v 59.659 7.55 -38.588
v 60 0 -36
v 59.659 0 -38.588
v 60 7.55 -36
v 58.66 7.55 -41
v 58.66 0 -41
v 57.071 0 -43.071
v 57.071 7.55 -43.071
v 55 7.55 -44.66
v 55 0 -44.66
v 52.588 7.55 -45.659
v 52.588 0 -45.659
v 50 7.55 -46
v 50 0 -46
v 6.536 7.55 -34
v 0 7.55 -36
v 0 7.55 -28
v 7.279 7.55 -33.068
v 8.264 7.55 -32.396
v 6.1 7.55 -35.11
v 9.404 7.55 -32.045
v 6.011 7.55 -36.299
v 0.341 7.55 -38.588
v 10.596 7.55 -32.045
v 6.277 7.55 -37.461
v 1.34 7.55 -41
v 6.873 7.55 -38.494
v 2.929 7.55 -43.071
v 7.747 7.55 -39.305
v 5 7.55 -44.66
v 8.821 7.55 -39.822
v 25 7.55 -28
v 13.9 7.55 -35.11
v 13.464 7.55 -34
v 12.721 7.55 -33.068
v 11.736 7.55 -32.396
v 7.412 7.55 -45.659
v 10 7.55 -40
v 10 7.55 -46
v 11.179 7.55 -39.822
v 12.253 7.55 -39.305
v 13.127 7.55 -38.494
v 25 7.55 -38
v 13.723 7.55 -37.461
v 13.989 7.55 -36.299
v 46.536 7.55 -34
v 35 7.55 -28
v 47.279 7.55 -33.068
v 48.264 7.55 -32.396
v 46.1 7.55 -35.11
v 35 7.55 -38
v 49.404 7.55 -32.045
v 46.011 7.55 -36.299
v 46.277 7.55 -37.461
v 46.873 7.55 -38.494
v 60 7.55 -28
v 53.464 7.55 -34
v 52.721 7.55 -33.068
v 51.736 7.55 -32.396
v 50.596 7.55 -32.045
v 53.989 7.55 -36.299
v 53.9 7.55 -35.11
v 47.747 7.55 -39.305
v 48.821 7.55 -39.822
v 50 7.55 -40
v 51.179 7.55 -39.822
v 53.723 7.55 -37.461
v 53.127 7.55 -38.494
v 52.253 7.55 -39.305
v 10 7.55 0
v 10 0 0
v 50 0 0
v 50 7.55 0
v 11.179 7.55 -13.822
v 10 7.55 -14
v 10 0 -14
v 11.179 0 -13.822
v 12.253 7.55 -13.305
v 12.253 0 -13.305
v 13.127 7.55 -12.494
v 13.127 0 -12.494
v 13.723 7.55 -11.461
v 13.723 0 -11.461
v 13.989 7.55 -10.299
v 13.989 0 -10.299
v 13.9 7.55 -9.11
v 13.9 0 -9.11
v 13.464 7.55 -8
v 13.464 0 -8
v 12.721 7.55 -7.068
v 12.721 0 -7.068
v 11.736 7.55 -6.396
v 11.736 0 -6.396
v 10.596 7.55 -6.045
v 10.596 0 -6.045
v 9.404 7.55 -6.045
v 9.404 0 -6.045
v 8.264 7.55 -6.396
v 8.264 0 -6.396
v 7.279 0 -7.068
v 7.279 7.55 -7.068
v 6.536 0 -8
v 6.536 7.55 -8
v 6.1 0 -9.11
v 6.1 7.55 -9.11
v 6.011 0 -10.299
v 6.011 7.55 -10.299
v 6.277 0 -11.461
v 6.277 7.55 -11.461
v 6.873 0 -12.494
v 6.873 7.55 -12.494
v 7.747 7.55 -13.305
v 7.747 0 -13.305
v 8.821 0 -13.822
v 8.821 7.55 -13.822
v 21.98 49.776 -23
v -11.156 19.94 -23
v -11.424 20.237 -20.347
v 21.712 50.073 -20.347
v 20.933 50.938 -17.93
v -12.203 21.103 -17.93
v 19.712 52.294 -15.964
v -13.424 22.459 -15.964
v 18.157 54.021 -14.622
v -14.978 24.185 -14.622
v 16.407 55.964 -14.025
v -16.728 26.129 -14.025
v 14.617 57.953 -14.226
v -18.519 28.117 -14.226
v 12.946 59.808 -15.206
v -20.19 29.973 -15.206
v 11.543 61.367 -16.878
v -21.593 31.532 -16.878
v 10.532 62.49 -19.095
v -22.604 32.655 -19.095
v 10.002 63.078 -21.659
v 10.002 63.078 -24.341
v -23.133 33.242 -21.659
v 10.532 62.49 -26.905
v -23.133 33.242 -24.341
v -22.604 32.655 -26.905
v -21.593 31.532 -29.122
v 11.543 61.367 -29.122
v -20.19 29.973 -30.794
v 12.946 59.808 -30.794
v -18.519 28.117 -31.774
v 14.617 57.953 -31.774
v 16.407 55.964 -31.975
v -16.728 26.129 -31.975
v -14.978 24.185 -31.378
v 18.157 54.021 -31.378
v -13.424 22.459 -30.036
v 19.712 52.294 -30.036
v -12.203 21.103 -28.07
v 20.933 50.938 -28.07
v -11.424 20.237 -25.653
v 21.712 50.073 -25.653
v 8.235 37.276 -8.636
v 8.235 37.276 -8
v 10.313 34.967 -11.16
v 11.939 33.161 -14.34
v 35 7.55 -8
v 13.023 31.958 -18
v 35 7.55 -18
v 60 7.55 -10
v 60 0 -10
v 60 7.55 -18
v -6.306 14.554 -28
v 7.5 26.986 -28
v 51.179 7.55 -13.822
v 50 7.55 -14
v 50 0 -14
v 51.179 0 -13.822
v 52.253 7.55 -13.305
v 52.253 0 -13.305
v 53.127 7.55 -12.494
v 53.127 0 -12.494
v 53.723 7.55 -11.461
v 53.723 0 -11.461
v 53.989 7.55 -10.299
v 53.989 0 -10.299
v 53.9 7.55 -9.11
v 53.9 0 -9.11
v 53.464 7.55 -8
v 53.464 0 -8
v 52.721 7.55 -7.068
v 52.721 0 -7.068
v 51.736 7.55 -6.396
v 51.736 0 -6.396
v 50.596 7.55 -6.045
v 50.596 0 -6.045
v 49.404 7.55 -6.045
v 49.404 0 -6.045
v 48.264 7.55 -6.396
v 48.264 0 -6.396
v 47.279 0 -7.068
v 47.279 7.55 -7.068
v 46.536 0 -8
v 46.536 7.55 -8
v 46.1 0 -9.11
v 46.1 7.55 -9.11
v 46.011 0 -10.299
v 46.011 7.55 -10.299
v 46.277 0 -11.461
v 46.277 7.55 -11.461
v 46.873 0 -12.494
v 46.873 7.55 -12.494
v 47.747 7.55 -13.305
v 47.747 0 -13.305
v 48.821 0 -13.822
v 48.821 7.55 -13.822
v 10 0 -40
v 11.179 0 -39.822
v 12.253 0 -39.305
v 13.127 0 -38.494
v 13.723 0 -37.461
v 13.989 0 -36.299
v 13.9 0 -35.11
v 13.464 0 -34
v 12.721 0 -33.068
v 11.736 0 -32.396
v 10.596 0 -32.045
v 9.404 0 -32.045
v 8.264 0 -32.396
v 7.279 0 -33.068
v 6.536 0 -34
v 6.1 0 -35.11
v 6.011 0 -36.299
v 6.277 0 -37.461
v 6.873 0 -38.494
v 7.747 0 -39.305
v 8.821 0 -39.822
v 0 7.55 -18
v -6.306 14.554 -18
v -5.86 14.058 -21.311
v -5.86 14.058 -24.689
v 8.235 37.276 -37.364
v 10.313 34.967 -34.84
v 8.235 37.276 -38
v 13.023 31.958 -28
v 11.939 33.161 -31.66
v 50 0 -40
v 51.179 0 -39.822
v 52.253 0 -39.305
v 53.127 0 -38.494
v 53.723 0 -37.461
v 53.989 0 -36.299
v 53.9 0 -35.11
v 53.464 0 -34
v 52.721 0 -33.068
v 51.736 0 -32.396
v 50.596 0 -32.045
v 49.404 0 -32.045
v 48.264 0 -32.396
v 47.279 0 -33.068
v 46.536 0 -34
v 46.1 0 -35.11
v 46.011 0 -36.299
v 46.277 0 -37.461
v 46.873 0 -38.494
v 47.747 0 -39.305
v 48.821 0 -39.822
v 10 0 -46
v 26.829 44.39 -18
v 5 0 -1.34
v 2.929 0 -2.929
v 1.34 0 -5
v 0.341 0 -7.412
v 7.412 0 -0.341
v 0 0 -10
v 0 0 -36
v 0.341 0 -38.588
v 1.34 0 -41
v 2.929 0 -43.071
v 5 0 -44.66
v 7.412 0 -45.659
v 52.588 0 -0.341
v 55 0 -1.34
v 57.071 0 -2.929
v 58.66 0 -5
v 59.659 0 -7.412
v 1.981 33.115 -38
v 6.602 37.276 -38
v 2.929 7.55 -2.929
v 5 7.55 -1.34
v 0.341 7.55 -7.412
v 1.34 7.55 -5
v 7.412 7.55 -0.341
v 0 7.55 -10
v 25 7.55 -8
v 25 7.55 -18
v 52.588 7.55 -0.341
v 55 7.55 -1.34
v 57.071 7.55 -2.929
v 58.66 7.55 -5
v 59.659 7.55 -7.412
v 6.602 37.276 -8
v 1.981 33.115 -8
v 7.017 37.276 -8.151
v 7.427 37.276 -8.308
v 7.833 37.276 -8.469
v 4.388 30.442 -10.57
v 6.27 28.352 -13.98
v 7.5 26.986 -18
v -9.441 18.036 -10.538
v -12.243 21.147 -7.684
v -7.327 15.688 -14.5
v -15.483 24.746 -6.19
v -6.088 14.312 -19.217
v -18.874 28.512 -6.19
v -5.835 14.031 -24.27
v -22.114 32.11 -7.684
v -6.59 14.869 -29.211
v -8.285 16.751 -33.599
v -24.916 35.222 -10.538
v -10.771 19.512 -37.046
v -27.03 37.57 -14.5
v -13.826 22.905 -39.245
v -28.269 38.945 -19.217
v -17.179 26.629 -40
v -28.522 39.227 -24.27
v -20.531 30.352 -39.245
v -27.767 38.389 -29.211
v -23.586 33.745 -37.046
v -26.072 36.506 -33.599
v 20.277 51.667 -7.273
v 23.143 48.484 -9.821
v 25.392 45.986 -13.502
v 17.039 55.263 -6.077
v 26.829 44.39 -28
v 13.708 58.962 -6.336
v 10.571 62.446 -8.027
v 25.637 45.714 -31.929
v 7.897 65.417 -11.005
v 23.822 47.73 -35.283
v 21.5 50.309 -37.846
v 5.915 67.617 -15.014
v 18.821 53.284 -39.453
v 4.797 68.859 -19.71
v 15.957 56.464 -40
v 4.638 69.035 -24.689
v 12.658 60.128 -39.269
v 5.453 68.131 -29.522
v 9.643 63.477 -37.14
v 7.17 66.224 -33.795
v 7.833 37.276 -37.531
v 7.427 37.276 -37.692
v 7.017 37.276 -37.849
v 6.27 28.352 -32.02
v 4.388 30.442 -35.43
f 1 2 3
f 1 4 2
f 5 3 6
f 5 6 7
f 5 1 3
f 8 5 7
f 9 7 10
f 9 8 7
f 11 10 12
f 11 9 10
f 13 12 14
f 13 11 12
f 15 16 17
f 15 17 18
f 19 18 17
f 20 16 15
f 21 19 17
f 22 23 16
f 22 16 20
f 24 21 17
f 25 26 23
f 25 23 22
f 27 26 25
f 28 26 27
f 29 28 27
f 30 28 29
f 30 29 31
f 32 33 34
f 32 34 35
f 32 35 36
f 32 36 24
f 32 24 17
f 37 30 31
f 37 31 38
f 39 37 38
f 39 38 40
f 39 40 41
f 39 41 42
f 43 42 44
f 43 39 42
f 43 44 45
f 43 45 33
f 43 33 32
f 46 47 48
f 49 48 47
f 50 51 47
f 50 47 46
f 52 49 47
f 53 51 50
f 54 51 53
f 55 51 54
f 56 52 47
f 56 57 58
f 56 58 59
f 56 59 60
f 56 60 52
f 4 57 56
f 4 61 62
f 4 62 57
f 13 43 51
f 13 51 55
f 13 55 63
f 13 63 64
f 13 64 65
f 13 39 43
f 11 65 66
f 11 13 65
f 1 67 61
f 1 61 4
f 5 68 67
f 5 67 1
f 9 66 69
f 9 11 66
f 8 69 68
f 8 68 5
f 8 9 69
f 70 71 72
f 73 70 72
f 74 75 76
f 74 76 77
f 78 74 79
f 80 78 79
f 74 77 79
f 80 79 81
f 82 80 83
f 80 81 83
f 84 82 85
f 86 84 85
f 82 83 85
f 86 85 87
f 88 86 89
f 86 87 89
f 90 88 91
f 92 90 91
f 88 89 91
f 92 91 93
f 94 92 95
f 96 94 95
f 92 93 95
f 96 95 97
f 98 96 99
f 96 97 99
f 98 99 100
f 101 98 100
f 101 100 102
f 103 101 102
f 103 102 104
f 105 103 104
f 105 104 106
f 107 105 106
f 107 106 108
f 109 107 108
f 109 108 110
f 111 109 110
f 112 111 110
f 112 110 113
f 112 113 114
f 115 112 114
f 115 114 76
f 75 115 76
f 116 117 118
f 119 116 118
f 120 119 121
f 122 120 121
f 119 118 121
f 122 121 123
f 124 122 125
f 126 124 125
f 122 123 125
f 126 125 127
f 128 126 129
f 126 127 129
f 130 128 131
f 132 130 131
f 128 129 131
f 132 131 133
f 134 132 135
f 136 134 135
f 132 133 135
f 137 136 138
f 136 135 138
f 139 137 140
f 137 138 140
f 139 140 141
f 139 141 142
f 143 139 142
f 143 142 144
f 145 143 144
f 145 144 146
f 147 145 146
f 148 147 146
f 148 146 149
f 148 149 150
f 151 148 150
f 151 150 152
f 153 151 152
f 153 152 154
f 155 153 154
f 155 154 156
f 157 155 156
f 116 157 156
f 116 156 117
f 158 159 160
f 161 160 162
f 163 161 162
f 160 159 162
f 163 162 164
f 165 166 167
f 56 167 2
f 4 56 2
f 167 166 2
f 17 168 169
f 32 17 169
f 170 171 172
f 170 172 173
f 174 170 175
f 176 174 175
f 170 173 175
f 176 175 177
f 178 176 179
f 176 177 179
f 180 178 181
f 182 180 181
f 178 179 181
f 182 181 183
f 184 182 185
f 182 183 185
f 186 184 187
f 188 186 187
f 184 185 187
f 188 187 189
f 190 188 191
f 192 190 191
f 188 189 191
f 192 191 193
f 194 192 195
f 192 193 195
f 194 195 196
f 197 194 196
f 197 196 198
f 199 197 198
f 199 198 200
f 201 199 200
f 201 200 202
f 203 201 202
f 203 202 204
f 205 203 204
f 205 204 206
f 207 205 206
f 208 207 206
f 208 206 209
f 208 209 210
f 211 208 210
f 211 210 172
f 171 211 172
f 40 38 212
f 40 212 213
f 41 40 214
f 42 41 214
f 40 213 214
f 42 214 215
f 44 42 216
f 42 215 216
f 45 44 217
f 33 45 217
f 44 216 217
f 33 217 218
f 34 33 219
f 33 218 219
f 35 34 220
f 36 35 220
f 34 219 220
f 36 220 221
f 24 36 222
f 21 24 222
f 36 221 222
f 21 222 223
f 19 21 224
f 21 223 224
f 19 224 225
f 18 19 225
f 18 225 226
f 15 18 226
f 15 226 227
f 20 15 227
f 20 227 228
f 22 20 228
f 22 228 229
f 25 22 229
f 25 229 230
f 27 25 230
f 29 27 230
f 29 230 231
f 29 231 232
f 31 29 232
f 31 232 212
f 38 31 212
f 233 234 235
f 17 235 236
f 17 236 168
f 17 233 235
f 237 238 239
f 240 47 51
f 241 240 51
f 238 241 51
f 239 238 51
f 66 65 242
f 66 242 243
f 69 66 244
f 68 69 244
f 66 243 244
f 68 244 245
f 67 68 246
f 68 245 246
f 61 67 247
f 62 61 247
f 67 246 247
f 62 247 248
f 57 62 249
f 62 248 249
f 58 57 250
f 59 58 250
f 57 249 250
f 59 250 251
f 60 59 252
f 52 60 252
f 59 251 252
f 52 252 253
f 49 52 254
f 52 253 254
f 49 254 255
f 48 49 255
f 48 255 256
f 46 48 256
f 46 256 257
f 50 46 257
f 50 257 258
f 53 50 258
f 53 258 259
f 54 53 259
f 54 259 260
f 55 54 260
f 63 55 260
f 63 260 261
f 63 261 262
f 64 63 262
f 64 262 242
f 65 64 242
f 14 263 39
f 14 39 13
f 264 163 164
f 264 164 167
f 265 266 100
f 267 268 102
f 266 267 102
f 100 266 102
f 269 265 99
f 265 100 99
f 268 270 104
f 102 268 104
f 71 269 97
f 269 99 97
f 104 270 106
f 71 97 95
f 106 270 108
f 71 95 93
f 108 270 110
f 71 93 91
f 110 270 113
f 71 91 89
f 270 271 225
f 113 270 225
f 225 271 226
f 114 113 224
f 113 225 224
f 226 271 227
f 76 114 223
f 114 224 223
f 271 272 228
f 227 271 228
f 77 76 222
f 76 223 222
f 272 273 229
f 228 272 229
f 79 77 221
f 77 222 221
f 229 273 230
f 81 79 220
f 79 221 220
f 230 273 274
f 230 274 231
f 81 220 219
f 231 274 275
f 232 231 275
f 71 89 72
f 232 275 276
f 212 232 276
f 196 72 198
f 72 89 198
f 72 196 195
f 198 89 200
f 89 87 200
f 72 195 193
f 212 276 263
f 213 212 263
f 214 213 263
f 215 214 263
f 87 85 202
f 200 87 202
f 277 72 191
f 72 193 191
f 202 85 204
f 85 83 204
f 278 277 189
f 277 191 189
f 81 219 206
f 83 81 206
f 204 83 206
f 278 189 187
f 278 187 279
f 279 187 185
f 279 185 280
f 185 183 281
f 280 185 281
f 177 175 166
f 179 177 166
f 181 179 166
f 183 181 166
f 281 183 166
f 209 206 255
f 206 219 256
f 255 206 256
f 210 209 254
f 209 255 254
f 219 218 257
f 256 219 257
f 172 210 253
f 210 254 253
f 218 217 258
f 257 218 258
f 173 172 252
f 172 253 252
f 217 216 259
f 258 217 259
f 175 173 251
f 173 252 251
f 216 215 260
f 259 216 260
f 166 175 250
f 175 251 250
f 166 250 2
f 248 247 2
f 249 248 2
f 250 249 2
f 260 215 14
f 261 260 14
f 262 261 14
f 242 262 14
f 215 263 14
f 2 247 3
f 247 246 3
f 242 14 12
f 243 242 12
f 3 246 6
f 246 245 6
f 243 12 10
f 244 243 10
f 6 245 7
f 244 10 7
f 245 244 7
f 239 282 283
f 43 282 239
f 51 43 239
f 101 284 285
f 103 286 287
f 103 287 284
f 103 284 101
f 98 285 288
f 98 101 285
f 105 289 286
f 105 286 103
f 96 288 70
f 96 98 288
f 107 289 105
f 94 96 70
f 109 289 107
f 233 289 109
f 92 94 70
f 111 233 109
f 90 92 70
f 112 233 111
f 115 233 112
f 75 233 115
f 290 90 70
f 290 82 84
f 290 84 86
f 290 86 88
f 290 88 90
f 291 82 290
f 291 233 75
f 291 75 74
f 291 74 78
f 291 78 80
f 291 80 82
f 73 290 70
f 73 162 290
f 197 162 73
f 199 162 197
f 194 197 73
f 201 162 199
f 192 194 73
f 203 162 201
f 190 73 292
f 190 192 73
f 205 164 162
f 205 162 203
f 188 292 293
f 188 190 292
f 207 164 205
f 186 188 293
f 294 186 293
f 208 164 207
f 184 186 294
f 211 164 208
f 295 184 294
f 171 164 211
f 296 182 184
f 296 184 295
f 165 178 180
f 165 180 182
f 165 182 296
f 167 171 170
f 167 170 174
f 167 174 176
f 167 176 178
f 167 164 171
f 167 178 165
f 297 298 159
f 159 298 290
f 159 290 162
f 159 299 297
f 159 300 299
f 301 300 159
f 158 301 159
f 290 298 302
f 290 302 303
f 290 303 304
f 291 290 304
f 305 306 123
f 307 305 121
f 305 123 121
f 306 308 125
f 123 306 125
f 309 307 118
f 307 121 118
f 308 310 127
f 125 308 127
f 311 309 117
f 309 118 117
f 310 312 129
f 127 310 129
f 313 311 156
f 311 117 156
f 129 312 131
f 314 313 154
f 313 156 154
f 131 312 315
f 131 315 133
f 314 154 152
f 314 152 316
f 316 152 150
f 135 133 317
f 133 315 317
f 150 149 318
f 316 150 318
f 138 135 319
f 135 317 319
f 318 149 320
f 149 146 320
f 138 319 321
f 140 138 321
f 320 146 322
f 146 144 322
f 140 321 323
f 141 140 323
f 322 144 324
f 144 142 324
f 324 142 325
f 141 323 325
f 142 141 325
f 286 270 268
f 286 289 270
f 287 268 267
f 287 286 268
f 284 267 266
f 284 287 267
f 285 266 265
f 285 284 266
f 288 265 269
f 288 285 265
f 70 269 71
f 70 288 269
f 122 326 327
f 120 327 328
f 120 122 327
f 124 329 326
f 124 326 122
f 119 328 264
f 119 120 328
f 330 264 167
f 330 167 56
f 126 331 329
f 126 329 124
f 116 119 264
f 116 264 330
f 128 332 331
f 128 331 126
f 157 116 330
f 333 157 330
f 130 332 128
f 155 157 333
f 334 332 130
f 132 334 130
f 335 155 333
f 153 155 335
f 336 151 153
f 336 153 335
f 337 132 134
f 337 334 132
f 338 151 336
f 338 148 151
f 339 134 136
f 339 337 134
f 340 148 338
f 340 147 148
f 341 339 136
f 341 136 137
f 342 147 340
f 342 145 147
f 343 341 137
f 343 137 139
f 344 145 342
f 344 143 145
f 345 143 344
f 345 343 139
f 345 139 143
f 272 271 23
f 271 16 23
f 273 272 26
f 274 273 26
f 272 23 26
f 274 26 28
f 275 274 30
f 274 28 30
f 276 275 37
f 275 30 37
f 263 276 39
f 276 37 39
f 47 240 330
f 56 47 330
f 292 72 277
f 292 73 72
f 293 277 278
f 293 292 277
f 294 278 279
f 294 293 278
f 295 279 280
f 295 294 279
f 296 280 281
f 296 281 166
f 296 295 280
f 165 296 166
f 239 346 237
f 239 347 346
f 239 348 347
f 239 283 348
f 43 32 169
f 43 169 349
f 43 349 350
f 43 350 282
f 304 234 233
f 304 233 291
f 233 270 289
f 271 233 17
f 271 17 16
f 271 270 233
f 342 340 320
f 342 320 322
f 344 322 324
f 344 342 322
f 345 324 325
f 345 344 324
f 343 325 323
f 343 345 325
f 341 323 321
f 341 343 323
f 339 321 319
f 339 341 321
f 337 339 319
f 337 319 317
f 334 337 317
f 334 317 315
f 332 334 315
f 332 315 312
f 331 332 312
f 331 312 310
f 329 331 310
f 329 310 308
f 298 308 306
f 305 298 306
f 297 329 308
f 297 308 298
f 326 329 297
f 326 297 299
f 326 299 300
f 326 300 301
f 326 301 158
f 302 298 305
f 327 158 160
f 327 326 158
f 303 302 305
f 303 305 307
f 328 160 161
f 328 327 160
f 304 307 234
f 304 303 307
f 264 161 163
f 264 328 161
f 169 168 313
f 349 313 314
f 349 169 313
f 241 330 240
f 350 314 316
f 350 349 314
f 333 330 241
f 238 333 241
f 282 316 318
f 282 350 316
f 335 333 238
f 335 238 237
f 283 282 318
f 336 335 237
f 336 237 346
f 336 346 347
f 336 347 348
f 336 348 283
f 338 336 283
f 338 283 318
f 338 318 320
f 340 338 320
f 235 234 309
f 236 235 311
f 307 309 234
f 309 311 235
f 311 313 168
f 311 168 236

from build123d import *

# Parameters (mm, degrees)
SKETCH1_W                  = 60
SKETCH1_H                  = 46
BOSS_EXTRUDE1_DEPTH        = 7.55
FILLET1_R                  = 10
F_8_0_8_DIAMETER_HOLE1_D   = 8
SKETCH4_W                  = 60
SKETCH4_H                  = 10
BOSS_EXTRUDE2_DEPTH        = 64
CUT_EXTRUDE1_DEPTH         = 50
SKETCH7_4_R                = 17
BOSS_EXTRUDE3_DEPTH        = 44.58869
SKETCH11_W                 = 10
SKETCH11_H                 = 10
BOSS_EXTRUDE4_DEPTH        = 40
F_18_0_18_DIAMETER_HOLE1_D = 18


with BuildPart() as part:
    # Sketch1 → Boss-Extrude1 (new body)
    with BuildSketch(Plane(origin=(0, 0, 0), x_dir=(1, 0, 0), z_dir=(0, 1, 0))):
        with Locations((30, 23)):
            Rectangle(SKETCH1_W, SKETCH1_H)
    extrude(amount=BOSS_EXTRUDE1_DEPTH)

    # Fillet1
    fillet1_edges = [part.edges().sort_by_distance(p)[0] for p in [
        (0, 3.775, -46),
        (60, 3.775, -46),
        (60, 3.775, 0),
        (0, 3.775, 0),
    ]]
    fillet(fillet1_edges, radius=FILLET1_R)

    # Ø8.0 (8) Diameter Hole1 (through all)
    with Locations(Plane(origin=(50, 7.55, -10), x_dir=(0, 0, 1), z_dir=(0, 1, 0))):
        with Locations((0, 0), (0, -40), (-26, -40), (-26, 0)):
            Hole(F_8_0_8_DIAMETER_HOLE1_D / 2)

    # Sketch4 → Boss-Extrude2 (add, along a direction that is not the sketch's normal)
    with BuildSketch(Plane(origin=(0, 7.55, 0), x_dir=(1, 0, 0), z_dir=(0, 1, 0))):
        with Locations((30, 23)):
            Rectangle(SKETCH4_W, SKETCH4_H)
    extrude(amount=BOSS_EXTRUDE2_DEPTH, dir=(-0.6691306063588565, 0.7431448254773959, 0))

    # Sketch7 → Cut-Extrude1 (cut)
    with BuildSketch(Plane(origin=(36.890174053, 33.216061912, 0), x_dir=(0, 0, -1), z_dir=(0.7431448254773956, 0.6691306063588568, 0))):
        with BuildLine():
            Line((14.444935509, 45.97411464), (14.444935509, 31.283611873))
            Line((14.444935509, 31.283611873), (33.990304022, 31.283611873))
            Line((33.990304022, 31.283611873), (33.990304022, 44.253315706))
            ThreePointArc((33.990304022, 44.253315706), (24.490934317, 48.218106695), (14.444935509, 45.97411464))
        make_face()
    extrude(amount=-CUT_EXTRUDE1_DEPTH, mode=Mode.SUBTRACT)


with BuildPart() as cut_extrude1_kept_piece:
    # of the separate pieces the step leaves, the one the design keeps (cut_extrude1_pieces_kept)
    add(part.part.solids().sort_by_distance((10, 0, 0))[0])

    # Sketch7<4> → Boss-Extrude3 (add)
    with BuildSketch(Plane(origin=(36.890174053, 33.216061912, 0), x_dir=(0, 0, -1), z_dir=(0.7431448254773956, 0.6691306063588568, 0))):
        with Locations((23, 31.283611873)):
            Circle(SKETCH7_4_R)
    extrude(amount=-BOSS_EXTRUDE3_DEPTH)

    # Sketch11 → Boss-Extrude4 (add, along a direction that is not the sketch's normal)
    with BuildSketch(Plane(origin=(0, 7.55, 0), x_dir=(1, 0, 0), z_dir=(0, 1, 0))):
        with Locations((30, 33)):
            Rectangle(SKETCH11_W, SKETCH11_H)
        with Locations((30, 13)):
            Rectangle(SKETCH11_W, SKETCH11_H)
    extrude(amount=BOSS_EXTRUDE4_DEPTH, dir=(-0.6691306063588565, 0.7431448254773958, 0))

    # Ø18.0 (18) Diameter Hole1 (through all)
    with Locations(Plane(origin=(15.957351871, 56.464316198, -23), x_dir=(-0.669130606359, 0.743144825477, 0), z_dir=(0.743144825477, 0.669130606359, 0))):
        with Locations((0, 0)):
            Hole(F_18_0_18_DIAMETER_HOLE1_D / 2)


solid = cut_extrude1_kept_piece.part
